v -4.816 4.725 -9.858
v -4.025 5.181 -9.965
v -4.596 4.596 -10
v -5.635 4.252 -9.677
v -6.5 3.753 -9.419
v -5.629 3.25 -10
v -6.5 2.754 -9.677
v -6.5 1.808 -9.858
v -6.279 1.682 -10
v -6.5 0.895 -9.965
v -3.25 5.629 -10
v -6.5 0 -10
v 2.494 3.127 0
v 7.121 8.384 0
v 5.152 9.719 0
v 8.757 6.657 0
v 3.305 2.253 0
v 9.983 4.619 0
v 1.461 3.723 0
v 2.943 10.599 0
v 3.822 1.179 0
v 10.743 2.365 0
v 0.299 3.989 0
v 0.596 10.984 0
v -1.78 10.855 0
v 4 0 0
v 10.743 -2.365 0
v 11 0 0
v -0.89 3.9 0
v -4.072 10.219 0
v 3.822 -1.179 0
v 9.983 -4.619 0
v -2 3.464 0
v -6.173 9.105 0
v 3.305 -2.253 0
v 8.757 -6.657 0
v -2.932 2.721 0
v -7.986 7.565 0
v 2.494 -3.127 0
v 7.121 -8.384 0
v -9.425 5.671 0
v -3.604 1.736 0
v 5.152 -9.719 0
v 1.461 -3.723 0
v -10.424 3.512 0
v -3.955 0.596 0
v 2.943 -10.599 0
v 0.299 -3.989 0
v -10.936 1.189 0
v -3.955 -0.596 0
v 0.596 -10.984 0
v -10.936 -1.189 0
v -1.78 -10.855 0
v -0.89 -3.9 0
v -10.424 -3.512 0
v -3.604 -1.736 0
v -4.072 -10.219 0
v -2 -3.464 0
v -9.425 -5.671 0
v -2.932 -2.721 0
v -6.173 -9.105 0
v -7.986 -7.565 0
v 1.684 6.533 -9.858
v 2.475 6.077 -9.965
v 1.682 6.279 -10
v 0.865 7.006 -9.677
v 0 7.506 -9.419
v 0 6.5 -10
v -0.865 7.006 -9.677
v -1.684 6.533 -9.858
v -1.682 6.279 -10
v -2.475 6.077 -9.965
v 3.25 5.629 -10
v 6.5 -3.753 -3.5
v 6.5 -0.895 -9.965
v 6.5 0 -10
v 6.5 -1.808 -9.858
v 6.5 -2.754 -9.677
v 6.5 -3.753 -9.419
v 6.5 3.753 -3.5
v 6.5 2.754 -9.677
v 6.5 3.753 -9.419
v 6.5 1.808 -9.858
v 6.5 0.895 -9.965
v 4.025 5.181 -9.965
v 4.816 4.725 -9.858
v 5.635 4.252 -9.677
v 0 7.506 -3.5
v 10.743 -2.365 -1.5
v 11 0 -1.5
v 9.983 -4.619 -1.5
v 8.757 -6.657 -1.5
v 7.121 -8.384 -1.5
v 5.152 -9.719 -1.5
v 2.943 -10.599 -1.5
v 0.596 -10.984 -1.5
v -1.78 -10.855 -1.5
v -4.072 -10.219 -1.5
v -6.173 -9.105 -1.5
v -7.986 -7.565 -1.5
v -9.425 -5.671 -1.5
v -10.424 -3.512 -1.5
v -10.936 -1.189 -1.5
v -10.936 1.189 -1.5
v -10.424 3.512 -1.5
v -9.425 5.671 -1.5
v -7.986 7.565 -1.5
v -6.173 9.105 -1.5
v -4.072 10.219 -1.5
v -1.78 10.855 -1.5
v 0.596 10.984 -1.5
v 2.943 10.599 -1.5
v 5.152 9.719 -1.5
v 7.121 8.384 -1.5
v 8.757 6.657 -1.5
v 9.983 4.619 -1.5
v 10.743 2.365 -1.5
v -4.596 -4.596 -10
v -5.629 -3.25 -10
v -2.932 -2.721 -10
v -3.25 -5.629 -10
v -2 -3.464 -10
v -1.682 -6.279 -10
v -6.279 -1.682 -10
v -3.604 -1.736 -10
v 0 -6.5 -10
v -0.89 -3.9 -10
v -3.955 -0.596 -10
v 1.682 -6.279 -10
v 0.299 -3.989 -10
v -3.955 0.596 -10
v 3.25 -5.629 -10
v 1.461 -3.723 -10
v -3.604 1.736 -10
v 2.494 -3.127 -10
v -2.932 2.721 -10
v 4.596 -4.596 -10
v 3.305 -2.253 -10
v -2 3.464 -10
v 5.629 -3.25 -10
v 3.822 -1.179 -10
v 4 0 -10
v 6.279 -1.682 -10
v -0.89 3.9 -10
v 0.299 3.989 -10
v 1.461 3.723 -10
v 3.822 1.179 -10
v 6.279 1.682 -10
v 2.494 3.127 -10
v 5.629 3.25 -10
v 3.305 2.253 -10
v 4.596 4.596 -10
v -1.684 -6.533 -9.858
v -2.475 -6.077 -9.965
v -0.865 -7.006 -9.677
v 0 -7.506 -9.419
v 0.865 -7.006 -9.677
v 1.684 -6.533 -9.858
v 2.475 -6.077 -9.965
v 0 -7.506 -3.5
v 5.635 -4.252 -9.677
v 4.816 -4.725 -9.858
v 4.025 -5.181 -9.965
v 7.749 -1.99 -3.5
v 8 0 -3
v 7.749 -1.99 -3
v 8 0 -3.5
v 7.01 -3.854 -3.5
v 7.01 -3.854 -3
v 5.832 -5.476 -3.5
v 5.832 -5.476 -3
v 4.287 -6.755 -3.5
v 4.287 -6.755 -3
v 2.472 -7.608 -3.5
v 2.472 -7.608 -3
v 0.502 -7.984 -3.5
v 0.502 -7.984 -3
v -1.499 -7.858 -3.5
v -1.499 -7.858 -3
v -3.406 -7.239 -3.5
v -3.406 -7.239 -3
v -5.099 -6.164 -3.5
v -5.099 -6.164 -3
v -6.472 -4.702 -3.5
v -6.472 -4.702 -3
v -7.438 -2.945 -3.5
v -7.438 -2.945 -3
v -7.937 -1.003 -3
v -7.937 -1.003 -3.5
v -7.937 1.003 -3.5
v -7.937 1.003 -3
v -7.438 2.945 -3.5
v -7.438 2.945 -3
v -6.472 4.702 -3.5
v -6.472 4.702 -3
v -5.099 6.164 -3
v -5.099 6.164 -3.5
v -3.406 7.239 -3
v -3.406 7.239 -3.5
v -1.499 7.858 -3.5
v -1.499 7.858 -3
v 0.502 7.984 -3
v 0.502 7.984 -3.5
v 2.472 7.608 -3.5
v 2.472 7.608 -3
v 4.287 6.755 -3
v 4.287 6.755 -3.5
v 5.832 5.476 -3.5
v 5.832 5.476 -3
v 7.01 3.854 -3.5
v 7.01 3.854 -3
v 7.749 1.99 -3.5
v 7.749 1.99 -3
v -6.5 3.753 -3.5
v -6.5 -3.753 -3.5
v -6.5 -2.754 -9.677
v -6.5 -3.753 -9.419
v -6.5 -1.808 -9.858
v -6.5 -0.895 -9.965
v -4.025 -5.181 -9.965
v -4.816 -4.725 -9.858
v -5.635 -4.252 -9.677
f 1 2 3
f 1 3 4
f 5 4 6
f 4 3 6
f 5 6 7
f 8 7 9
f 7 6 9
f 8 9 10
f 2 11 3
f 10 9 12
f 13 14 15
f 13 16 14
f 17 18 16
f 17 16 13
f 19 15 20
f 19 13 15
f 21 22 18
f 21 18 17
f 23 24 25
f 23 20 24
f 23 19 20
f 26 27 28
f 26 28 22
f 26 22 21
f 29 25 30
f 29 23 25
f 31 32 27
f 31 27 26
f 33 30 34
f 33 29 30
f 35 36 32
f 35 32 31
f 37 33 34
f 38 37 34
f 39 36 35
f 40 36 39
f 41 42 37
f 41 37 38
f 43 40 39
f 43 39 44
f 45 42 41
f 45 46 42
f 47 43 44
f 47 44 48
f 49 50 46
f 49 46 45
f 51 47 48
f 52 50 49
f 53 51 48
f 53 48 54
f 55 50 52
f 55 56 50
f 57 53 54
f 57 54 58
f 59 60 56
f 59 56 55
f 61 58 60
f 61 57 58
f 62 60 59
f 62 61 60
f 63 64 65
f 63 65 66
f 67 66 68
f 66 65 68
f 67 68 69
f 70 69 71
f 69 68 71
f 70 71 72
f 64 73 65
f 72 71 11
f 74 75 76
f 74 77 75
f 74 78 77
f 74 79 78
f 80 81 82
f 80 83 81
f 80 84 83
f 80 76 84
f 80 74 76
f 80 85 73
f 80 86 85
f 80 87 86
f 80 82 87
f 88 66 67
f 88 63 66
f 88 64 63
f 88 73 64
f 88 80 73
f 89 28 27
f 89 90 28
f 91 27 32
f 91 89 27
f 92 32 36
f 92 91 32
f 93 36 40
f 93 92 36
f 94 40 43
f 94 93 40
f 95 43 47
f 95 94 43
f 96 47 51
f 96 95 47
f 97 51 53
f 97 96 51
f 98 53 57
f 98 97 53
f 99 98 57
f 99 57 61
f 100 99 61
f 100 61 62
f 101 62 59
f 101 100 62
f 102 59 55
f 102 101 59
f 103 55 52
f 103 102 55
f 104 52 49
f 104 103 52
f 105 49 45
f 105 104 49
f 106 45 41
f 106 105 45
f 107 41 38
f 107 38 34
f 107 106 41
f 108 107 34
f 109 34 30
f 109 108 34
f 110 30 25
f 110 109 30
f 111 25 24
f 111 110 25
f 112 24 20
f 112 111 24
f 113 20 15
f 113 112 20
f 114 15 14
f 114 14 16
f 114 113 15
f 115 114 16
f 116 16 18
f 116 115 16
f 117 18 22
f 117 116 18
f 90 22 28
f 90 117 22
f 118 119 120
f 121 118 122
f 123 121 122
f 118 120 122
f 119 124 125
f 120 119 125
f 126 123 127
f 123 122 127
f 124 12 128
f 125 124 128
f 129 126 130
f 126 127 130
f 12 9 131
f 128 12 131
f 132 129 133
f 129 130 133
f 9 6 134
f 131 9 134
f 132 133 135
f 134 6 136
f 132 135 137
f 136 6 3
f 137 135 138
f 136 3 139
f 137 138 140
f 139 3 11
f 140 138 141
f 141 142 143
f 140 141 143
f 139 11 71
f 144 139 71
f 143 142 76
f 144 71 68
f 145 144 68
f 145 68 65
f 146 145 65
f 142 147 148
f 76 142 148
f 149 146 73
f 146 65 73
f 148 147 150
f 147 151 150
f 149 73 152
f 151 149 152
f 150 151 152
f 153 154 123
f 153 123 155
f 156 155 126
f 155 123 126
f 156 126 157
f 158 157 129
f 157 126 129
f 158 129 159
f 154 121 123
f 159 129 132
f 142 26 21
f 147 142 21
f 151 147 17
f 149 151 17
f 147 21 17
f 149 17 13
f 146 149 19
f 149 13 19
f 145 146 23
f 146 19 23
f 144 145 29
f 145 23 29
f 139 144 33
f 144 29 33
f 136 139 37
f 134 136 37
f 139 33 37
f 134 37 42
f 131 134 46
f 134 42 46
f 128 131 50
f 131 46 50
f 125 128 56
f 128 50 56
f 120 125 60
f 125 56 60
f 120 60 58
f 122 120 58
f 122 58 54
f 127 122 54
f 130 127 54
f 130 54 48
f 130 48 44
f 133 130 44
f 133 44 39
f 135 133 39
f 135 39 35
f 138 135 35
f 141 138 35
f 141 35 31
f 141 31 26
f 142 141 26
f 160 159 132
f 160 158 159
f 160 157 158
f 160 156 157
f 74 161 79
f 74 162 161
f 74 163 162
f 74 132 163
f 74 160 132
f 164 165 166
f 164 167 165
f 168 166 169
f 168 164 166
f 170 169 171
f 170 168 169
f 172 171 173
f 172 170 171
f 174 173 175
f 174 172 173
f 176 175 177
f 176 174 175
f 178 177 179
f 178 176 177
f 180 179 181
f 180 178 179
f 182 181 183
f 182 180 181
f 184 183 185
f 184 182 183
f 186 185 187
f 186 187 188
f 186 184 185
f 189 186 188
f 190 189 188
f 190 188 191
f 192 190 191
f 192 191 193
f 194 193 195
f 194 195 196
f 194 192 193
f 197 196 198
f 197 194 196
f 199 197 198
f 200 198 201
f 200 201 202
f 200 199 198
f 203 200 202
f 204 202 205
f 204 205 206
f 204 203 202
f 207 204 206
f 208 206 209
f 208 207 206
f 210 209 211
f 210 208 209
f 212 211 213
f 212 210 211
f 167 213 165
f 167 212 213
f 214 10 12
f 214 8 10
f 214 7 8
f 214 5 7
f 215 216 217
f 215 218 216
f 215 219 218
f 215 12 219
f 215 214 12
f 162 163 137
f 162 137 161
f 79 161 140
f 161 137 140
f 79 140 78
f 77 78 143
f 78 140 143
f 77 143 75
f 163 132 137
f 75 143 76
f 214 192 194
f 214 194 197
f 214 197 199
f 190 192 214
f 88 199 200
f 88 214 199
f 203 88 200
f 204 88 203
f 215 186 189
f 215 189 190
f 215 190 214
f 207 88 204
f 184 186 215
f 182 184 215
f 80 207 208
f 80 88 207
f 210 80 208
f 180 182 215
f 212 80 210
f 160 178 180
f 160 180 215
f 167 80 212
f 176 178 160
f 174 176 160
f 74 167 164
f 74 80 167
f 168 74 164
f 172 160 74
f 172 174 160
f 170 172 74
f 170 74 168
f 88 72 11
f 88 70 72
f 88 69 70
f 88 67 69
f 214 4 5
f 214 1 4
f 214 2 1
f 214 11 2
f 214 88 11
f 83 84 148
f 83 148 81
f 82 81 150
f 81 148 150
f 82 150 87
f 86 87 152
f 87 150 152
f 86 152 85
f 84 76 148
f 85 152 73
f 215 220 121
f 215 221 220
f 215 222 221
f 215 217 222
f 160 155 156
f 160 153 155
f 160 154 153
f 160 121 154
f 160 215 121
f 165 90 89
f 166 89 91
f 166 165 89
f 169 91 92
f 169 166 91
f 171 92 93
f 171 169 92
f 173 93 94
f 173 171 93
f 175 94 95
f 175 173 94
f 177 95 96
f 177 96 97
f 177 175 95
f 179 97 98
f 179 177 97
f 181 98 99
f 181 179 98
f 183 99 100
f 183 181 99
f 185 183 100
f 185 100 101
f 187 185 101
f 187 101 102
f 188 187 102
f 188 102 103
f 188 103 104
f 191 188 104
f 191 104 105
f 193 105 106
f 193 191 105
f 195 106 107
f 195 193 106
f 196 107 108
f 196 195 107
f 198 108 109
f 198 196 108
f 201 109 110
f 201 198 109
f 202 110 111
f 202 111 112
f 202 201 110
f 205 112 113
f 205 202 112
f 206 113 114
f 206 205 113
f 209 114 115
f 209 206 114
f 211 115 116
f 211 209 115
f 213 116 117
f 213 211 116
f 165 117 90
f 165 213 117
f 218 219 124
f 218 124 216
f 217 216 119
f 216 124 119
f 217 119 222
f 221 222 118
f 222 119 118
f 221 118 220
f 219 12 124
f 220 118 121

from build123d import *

# Parameters (mm, degrees)
BASE_EXTRUSION_DEPTH    = 10
ESQUISSE3_R             = 4
ENL_V_MAT_EXTRU_1_DEPTH = 15.091959883


with BuildPart() as part:
    # Esquisse1 → Base-Extrusion (new body)
    with BuildSketch(Plane.XY):
        Polygon((6.5, -3.75277675), (6.5, 3.75277675), (0, 7.505553499), (-6.5, 3.75277675), (-6.5, -3.75277675), (0, -7.505553499), align=None)
    extrude(amount=-BASE_EXTRUSION_DEPTH)

    # Esquisse2 → Enlèvement de matière-Révolution1 (revolve, cut)
    with BuildSketch(Plane(origin=(0, 0, 0), x_dir=(1, 0, 0), z_dir=(0, 1, 0))):
        Polygon((-6.5, 10), (-23.820508076, 10), (-23.820508076, 0), align=None)
    revolve(axis=Axis((0, 0, -10), (0, 0, 1)), mode=Mode.SUBTRACT)

    # Esquisse3 → Enlèv. mat.-Extru.1 (cut, through all)
    with BuildSketch(Plane.XY):
        Circle(ESQUISSE3_R)
    extrude(amount=-ENL_V_MAT_EXTRU_1_DEPTH, mode=Mode.SUBTRACT)

    # Esquisse4 → Boss.-Révol.1 (revolve)
    with BuildSketch(Plane(origin=(0, 0, 0), x_dir=(1, 0, 0), z_dir=(0, 1, 0))):
        Polygon((-6.5, 0), (-11, 0), (-11, 1.5), (-8, 3), (-8, 3.5), (-6.5, 3.5), align=None)
    revolve(axis=Axis((0, 0, 0), (0, 0, -1)))


solid = part.part
